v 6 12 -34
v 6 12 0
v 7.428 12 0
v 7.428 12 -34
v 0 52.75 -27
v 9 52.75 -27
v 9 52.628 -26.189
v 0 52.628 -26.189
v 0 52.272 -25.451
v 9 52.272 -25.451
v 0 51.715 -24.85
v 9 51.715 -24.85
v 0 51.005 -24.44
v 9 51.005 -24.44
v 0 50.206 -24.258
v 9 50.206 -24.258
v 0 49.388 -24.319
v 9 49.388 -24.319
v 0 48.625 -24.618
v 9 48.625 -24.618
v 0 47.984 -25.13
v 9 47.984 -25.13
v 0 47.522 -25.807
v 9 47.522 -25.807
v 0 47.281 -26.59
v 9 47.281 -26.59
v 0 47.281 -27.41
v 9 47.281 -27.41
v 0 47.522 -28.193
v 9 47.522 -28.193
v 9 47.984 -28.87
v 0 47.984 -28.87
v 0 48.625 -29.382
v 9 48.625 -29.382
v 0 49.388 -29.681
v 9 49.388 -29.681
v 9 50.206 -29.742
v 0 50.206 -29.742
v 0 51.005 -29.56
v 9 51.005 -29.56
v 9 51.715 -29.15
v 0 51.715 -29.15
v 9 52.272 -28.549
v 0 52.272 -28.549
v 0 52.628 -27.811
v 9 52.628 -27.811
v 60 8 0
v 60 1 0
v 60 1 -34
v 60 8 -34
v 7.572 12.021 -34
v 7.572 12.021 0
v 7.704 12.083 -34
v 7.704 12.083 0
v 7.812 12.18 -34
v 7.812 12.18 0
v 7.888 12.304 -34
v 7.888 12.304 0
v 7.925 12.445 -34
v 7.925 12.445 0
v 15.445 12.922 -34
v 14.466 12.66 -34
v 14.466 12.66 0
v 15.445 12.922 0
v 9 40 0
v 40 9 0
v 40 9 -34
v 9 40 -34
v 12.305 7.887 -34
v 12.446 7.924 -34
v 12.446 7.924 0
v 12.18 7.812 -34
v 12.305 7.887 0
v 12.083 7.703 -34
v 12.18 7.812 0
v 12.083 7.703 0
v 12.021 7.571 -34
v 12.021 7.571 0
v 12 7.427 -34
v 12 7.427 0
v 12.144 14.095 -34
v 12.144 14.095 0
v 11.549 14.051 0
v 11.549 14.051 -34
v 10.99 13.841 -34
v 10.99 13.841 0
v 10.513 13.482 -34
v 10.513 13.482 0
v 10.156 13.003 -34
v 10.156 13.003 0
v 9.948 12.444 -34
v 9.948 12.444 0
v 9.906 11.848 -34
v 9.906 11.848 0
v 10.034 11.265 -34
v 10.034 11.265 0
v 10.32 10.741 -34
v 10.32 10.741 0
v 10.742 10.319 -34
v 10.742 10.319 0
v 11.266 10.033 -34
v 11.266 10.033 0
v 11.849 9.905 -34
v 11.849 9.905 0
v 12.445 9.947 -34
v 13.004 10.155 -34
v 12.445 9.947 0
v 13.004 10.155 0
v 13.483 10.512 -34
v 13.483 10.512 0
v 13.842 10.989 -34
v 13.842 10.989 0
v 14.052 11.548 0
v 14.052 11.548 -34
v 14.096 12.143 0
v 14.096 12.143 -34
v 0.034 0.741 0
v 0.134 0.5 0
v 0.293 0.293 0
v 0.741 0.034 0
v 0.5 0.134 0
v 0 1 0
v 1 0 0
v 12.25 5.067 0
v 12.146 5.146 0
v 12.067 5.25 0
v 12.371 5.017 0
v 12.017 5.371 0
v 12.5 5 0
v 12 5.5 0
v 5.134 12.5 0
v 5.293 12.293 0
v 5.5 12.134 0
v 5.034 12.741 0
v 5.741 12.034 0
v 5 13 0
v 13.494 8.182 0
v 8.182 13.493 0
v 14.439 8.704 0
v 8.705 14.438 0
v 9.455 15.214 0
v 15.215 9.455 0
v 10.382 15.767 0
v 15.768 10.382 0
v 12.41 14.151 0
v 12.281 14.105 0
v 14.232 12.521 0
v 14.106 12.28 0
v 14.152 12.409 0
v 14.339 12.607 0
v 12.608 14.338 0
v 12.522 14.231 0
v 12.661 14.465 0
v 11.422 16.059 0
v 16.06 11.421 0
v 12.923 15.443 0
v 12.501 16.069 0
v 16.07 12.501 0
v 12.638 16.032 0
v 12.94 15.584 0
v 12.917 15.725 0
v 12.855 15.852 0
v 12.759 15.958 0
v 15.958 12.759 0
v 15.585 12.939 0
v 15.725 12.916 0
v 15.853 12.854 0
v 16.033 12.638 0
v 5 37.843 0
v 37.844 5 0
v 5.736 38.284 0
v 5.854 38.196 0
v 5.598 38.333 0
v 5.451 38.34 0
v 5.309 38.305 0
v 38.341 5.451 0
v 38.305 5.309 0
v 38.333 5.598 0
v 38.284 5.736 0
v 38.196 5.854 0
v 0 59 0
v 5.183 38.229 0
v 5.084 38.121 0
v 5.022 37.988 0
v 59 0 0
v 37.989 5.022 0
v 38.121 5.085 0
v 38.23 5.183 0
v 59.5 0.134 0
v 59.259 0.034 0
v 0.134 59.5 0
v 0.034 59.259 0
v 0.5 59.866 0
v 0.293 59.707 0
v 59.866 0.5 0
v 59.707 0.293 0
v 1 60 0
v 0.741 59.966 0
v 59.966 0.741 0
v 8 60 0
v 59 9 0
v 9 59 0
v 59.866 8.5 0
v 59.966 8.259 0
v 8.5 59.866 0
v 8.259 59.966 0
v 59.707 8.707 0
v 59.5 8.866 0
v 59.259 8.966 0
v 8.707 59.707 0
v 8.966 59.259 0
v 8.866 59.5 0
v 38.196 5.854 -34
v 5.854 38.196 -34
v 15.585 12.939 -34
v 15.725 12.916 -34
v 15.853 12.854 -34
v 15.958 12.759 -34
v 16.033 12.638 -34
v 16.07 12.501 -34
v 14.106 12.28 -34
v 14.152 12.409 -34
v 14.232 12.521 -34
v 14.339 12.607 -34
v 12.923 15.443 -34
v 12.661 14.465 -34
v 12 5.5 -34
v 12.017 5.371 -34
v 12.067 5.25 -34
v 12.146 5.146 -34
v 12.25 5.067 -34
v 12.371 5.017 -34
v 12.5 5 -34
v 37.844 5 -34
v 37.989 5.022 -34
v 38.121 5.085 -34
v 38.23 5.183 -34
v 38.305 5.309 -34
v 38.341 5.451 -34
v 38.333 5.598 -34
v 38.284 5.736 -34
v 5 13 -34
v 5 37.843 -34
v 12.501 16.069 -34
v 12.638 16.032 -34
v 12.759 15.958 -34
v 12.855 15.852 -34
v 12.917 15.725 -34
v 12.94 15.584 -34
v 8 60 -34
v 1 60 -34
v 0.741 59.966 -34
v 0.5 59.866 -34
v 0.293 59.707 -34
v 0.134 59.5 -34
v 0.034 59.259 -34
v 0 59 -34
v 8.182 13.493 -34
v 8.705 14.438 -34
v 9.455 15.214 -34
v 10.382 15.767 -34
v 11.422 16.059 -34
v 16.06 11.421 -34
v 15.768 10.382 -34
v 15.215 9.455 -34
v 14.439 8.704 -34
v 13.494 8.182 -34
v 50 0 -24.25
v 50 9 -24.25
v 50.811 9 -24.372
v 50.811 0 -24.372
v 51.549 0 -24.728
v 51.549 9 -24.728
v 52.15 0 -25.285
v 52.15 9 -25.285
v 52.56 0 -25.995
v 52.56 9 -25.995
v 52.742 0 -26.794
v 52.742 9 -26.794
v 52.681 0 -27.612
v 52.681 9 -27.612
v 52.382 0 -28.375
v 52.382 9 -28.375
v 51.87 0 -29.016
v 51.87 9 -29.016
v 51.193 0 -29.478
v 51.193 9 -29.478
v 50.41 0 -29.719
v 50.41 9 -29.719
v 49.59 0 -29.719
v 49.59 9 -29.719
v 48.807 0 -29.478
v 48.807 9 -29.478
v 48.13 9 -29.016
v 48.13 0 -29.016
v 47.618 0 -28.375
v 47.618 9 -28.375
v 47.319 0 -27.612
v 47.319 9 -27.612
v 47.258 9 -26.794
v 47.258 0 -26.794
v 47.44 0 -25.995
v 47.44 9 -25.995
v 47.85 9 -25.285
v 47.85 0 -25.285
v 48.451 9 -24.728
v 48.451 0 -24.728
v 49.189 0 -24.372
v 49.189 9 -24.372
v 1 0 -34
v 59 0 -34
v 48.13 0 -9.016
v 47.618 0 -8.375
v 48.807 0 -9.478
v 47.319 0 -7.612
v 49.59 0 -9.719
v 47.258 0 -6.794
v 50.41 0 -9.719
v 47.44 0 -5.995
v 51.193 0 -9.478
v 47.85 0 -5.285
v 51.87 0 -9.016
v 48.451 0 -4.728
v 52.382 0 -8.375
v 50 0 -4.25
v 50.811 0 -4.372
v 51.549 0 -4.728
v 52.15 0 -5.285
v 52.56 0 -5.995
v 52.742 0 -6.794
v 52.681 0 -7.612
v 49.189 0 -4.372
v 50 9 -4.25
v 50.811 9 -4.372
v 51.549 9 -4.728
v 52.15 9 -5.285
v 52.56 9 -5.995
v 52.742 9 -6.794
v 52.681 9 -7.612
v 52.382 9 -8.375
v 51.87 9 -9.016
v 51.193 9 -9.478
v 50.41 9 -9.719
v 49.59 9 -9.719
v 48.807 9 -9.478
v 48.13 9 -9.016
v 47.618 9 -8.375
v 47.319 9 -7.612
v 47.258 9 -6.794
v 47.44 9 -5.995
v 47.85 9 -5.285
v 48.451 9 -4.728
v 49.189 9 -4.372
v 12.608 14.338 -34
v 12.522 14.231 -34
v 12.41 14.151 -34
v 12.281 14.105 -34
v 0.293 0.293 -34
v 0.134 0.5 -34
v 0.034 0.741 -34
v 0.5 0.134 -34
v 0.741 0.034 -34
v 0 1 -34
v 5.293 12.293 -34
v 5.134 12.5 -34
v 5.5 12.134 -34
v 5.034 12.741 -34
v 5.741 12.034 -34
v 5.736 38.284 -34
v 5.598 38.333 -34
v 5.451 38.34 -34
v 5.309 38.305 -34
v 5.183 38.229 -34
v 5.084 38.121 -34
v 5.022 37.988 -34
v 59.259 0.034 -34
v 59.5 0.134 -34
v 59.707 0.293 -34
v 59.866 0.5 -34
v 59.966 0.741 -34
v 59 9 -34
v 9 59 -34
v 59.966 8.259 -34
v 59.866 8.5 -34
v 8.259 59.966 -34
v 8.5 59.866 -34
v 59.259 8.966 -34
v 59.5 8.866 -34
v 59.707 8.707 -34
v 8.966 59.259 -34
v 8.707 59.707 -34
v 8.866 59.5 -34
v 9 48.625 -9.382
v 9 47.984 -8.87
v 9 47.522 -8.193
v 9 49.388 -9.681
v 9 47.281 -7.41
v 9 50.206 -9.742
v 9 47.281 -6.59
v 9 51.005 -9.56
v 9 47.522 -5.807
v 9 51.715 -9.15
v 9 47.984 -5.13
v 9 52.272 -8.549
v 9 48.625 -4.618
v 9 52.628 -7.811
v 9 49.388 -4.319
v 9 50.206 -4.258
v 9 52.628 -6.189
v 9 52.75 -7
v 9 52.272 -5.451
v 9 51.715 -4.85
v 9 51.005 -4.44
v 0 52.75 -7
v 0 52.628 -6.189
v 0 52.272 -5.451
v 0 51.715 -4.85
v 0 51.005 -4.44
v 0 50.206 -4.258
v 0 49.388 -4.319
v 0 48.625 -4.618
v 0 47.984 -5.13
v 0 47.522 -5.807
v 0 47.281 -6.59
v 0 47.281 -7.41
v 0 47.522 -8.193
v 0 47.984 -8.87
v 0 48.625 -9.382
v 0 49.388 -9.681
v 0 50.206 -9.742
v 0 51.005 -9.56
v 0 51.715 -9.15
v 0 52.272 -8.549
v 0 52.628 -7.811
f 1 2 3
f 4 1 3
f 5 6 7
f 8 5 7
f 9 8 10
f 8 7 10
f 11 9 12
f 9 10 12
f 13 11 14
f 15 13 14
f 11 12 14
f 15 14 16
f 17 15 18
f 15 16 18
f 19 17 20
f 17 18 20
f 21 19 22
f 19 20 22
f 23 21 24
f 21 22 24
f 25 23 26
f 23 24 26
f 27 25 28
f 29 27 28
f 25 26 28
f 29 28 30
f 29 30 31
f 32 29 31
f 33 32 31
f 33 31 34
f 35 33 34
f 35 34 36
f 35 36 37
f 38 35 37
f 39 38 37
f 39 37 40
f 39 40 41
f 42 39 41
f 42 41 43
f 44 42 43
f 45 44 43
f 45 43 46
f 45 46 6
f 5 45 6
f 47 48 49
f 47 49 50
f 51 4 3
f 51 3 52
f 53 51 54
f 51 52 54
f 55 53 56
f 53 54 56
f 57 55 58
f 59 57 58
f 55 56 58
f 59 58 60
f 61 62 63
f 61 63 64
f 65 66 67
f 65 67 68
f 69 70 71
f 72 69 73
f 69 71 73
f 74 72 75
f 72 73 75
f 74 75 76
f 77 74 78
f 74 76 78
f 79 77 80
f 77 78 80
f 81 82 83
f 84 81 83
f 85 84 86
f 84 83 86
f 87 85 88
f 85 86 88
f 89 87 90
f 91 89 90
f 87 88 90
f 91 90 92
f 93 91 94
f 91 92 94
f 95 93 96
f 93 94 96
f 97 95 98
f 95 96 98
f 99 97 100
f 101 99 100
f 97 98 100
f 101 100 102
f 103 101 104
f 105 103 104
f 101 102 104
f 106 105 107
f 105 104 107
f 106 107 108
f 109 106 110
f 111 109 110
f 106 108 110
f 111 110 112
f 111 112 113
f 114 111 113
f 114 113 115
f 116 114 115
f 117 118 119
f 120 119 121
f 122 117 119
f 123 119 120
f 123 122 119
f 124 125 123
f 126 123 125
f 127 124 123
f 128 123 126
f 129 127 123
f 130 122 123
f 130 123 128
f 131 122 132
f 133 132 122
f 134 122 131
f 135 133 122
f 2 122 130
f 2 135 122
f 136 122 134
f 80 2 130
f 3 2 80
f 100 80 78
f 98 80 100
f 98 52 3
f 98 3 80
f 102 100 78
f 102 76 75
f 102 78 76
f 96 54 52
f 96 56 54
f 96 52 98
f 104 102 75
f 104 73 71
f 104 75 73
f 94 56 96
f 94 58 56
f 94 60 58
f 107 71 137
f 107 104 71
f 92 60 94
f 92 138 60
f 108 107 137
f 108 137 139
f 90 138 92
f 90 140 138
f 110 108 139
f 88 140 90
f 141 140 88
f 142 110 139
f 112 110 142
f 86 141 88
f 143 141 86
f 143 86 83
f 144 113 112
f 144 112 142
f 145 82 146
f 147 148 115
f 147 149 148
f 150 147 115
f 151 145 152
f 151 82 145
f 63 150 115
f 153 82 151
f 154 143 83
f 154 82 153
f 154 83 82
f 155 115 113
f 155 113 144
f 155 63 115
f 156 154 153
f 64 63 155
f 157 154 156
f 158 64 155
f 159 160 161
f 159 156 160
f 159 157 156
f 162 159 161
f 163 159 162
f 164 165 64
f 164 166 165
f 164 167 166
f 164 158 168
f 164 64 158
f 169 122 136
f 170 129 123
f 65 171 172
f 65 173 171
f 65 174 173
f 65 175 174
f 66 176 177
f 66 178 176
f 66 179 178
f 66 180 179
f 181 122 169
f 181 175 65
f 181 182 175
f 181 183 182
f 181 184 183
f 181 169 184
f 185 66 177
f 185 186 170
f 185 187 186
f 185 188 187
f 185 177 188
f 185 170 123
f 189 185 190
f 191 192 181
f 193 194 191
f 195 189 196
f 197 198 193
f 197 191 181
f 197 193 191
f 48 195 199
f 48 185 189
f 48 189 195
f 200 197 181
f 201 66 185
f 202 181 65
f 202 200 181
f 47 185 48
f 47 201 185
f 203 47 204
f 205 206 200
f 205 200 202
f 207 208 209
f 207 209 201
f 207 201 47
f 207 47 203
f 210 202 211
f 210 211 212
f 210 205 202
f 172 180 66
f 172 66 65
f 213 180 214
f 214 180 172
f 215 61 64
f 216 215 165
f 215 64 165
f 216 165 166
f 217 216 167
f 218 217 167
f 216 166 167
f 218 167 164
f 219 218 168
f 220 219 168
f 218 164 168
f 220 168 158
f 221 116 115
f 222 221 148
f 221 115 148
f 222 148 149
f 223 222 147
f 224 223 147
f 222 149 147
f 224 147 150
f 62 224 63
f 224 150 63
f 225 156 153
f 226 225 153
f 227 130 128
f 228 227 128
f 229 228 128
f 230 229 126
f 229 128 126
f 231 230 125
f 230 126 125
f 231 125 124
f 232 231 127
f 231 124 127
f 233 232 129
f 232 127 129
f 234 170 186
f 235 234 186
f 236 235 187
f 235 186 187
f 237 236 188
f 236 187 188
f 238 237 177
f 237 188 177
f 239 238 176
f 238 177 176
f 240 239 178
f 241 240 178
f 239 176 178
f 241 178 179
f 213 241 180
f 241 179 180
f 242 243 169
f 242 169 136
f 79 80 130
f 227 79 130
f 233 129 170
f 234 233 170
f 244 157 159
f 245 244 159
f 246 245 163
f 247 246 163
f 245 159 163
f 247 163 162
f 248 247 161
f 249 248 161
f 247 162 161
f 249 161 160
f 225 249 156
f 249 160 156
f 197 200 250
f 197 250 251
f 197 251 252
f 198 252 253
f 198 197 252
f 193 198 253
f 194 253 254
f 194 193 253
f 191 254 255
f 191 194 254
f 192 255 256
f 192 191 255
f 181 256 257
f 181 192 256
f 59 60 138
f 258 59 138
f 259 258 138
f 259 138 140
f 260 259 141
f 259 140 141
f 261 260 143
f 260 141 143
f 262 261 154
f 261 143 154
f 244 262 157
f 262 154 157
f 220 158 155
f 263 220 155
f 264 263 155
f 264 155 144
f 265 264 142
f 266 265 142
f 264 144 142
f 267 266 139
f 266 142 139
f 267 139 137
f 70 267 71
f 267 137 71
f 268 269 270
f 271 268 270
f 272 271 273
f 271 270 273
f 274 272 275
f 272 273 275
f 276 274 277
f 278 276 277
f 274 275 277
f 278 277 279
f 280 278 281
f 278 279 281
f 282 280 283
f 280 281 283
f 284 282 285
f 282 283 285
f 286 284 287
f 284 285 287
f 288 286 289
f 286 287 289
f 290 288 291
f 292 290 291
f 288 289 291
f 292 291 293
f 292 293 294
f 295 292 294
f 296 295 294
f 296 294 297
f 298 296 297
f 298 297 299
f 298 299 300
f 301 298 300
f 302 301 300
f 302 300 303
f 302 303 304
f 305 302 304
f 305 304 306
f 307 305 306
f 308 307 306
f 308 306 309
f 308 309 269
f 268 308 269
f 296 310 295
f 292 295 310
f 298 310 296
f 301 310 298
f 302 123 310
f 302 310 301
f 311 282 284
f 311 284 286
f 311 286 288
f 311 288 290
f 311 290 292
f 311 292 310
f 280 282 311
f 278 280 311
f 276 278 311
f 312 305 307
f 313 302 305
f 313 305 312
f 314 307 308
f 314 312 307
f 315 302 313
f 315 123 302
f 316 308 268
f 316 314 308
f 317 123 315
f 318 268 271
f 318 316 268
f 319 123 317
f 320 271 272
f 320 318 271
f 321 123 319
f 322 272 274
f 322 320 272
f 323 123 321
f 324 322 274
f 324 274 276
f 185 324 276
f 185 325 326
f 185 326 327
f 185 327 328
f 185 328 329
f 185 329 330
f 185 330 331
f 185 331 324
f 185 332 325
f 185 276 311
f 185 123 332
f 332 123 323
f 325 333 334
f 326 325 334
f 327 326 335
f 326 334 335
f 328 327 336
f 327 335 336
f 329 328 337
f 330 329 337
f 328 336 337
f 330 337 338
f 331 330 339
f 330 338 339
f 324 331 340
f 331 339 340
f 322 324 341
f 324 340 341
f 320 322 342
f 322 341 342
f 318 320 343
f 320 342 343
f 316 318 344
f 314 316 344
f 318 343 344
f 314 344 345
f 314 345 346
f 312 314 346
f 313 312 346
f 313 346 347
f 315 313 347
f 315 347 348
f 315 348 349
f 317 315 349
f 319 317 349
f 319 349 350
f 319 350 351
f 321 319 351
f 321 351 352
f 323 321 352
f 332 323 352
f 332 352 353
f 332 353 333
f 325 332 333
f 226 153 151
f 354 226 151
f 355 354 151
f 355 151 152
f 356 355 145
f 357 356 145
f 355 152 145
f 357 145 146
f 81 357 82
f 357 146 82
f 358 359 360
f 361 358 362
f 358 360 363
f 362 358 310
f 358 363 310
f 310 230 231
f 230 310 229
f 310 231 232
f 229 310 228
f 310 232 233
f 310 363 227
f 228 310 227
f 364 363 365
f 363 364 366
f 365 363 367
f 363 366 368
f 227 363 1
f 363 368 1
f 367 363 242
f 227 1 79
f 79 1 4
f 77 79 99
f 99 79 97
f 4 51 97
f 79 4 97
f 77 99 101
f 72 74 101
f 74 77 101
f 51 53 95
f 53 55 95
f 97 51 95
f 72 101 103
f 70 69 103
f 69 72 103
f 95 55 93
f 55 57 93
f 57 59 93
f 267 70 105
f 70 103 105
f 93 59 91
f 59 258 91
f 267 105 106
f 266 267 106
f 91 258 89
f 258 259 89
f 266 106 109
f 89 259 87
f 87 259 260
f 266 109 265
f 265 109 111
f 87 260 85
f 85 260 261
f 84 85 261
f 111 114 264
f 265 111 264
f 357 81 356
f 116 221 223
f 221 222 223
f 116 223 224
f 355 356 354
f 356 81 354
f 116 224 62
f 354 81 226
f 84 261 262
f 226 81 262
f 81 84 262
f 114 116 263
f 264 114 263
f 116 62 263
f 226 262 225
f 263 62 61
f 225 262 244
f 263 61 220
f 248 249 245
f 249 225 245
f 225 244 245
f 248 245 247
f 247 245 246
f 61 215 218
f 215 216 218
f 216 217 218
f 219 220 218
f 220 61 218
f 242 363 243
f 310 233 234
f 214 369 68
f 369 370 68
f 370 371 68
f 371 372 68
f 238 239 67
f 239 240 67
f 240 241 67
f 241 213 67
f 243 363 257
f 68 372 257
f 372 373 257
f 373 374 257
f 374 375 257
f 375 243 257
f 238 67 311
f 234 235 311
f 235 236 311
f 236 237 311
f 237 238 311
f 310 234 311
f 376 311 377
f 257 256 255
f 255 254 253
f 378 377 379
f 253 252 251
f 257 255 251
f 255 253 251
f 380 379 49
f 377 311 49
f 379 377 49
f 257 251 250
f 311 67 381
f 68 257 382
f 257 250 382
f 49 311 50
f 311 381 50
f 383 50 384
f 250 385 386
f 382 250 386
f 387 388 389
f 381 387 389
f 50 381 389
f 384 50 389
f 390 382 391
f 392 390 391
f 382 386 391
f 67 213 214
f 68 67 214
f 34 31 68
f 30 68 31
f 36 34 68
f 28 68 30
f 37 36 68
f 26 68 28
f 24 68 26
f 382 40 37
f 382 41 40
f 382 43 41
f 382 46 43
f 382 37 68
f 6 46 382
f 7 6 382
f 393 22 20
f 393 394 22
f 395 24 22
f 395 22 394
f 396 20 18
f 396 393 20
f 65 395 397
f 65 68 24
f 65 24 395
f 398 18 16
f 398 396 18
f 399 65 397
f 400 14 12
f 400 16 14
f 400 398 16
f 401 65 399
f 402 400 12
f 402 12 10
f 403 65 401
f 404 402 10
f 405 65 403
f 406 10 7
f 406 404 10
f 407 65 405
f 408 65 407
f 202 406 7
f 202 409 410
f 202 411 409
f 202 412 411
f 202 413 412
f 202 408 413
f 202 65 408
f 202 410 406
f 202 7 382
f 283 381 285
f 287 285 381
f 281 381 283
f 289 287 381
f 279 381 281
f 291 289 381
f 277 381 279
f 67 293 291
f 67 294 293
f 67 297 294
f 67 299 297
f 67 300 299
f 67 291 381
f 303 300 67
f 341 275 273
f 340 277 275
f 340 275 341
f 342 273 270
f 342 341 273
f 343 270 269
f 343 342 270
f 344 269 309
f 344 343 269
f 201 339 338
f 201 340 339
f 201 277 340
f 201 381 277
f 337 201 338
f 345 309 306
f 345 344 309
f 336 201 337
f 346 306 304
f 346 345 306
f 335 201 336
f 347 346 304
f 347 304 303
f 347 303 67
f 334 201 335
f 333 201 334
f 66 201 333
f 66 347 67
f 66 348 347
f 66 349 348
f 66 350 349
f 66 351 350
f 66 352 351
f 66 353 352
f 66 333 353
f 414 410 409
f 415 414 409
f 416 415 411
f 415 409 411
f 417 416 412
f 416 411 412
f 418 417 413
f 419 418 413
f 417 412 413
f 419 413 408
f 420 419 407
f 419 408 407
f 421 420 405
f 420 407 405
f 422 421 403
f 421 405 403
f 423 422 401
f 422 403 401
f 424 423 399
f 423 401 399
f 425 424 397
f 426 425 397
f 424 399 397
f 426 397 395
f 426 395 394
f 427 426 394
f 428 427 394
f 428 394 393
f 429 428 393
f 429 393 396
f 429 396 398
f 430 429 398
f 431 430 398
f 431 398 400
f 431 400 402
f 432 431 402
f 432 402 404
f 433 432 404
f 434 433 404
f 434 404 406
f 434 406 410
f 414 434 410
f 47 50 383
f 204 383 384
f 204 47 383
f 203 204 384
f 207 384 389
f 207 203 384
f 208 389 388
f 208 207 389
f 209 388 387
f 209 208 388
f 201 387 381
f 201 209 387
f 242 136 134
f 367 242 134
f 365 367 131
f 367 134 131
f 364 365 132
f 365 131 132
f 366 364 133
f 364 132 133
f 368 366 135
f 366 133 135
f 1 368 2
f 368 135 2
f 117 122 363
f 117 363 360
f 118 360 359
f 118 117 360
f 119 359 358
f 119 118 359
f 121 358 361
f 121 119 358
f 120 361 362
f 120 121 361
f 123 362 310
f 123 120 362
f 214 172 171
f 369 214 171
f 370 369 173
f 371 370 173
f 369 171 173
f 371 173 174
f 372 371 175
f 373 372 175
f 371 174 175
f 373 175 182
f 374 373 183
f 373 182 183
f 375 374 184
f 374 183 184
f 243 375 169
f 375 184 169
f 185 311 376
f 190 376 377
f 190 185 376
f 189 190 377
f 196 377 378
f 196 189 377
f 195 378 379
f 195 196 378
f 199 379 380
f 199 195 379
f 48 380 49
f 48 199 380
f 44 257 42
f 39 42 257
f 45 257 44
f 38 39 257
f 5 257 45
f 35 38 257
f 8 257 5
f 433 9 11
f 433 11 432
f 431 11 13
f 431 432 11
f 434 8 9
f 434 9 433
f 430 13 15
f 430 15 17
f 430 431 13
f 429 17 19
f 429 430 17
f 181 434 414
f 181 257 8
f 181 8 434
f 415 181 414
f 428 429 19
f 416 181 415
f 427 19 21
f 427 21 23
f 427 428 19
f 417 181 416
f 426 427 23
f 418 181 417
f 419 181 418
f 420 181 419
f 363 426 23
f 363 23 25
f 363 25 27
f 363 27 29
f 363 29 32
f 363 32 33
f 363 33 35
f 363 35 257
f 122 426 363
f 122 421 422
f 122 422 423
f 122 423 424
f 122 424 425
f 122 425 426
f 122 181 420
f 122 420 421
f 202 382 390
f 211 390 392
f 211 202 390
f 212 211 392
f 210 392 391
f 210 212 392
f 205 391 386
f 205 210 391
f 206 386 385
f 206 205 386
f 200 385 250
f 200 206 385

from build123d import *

# Parameters (mm, degrees)
EXTRUDE_14_DEPTH     = 34
SKETCH_41_R          = 2.75
CUT_EXTRUDE_27_DEPTH = 86.772956111
SKETCH_42_R          = 2.75
CUT_EXTRUDE_28_DEPTH = 86.772956111


with BuildPart() as part:
    # 草图40 → 凸台-拉伸14 (new body)
    with BuildSketch(Plane.XY):
        with BuildLine():
            Line((40, 9), (9, 40))
            Line((9, 40), (9, 59))
            ThreePointArc((9, 59), (8.707106781, 59.707106781), (8, 60))
            Line((8, 60), (1, 60))
            ThreePointArc((1, 60), (0.292893219, 59.707106781), (0, 59))
            Line((0, 59), (0, 1))
            ThreePointArc((0, 1), (0.292893219, 0.292893219), (1, 0))
            Line((1, 0), (59, 0))
            ThreePointArc((59, 0), (59.707106781, 0.292893219), (60, 1))
            Line((60, 1), (60, 8))
            ThreePointArc((60, 8), (59.707106781, 8.707106781), (59, 9))
            Line((59, 9), (40, 9))
        make_face()
        with BuildLine():
            Line((6, 12), (7.428034206, 12))
            ThreePointArc((7.428034206, 12), (7.761575809, 12.12750839), (7.925, 12.445000003))
            ThreePointArc((7.925, 12.445000003), (9.455281371, 15.213766145), (12.501000018, 16.068999998))
            ThreePointArc((12.501000018, 16.068999998), (12.854580587, 15.852403207), (12.923122843, 15.443459021))
            Line((12.923122843, 15.443459021), (12.661152875, 14.464571239))
            ThreePointArc((12.661152875, 14.464571239), (12.468861172, 14.18703128), (12.144000016, 14.094999999))
            ThreePointArc((12.144000016, 14.094999999), (10.51595825, 10.514958251), (14.095999999, 12.143000014))
            ThreePointArc((14.095999999, 12.143000014), (14.18803128, 12.467861171), (14.465571239, 12.660152875))
            Line((14.465571239, 12.660152875), (15.444578727, 12.922154879))
            ThreePointArc((15.444578727, 12.922154879), (15.853118545, 12.853885203), (16.07, 12.501))
            ThreePointArc((16.07, 12.501), (15.215158242, 9.454636451), (12.446000002, 7.924))
            ThreePointArc((12.446000002, 7.924), (12.127844119, 7.760840711), (12, 7.426924553))
            Line((12, 7.426924553), (12, 5.5))
            ThreePointArc((12, 5.5), (12.146446609, 5.146446609), (12.5, 5))
            Line((12.5, 5), (37.844, 5))
            ThreePointArc((37.844, 5), (38.305045436, 5.30916781), (38.196447939, 5.853552061))
            Line((38.196447939, 5.853552061), (5.853553317, 38.196446683))
            ThreePointArc((5.853553317, 38.196446683), (5.308658302, 38.304832993), (5, 37.842893363))
            Line((5, 37.842893363), (5, 13))
            ThreePointArc((5, 13), (5.292893219, 12.292893219), (6, 12))
        make_face(mode=Mode.SUBTRACT)
    extrude(amount=-EXTRUDE_14_DEPTH)

    # 草图41 → 切除-拉伸27 (cut, through all)
    with BuildSketch(Plane(origin=(0, 9, 0), x_dir=(1, 0, 0), z_dir=(0, 1, 0))):
        with Locations((50, 27)):
            Circle(SKETCH_41_R)
        with Locations((50, 7)):
            Circle(SKETCH_41_R)
    extrude(amount=-CUT_EXTRUDE_27_DEPTH, mode=Mode.SUBTRACT)

    # 草图42 → 切除-拉伸28 (cut, through all)
    with BuildSketch(Plane(origin=(9, 0, 0), x_dir=(0, 0, -1), z_dir=(1, 0, 0))):
        with Locations((7, 50)):
            Circle(SKETCH_42_R)
        with Locations((27, 50)):
            Circle(SKETCH_42_R)
    extrude(amount=-CUT_EXTRUDE_28_DEPTH, mode=Mode.SUBTRACT)


solid = part.part
